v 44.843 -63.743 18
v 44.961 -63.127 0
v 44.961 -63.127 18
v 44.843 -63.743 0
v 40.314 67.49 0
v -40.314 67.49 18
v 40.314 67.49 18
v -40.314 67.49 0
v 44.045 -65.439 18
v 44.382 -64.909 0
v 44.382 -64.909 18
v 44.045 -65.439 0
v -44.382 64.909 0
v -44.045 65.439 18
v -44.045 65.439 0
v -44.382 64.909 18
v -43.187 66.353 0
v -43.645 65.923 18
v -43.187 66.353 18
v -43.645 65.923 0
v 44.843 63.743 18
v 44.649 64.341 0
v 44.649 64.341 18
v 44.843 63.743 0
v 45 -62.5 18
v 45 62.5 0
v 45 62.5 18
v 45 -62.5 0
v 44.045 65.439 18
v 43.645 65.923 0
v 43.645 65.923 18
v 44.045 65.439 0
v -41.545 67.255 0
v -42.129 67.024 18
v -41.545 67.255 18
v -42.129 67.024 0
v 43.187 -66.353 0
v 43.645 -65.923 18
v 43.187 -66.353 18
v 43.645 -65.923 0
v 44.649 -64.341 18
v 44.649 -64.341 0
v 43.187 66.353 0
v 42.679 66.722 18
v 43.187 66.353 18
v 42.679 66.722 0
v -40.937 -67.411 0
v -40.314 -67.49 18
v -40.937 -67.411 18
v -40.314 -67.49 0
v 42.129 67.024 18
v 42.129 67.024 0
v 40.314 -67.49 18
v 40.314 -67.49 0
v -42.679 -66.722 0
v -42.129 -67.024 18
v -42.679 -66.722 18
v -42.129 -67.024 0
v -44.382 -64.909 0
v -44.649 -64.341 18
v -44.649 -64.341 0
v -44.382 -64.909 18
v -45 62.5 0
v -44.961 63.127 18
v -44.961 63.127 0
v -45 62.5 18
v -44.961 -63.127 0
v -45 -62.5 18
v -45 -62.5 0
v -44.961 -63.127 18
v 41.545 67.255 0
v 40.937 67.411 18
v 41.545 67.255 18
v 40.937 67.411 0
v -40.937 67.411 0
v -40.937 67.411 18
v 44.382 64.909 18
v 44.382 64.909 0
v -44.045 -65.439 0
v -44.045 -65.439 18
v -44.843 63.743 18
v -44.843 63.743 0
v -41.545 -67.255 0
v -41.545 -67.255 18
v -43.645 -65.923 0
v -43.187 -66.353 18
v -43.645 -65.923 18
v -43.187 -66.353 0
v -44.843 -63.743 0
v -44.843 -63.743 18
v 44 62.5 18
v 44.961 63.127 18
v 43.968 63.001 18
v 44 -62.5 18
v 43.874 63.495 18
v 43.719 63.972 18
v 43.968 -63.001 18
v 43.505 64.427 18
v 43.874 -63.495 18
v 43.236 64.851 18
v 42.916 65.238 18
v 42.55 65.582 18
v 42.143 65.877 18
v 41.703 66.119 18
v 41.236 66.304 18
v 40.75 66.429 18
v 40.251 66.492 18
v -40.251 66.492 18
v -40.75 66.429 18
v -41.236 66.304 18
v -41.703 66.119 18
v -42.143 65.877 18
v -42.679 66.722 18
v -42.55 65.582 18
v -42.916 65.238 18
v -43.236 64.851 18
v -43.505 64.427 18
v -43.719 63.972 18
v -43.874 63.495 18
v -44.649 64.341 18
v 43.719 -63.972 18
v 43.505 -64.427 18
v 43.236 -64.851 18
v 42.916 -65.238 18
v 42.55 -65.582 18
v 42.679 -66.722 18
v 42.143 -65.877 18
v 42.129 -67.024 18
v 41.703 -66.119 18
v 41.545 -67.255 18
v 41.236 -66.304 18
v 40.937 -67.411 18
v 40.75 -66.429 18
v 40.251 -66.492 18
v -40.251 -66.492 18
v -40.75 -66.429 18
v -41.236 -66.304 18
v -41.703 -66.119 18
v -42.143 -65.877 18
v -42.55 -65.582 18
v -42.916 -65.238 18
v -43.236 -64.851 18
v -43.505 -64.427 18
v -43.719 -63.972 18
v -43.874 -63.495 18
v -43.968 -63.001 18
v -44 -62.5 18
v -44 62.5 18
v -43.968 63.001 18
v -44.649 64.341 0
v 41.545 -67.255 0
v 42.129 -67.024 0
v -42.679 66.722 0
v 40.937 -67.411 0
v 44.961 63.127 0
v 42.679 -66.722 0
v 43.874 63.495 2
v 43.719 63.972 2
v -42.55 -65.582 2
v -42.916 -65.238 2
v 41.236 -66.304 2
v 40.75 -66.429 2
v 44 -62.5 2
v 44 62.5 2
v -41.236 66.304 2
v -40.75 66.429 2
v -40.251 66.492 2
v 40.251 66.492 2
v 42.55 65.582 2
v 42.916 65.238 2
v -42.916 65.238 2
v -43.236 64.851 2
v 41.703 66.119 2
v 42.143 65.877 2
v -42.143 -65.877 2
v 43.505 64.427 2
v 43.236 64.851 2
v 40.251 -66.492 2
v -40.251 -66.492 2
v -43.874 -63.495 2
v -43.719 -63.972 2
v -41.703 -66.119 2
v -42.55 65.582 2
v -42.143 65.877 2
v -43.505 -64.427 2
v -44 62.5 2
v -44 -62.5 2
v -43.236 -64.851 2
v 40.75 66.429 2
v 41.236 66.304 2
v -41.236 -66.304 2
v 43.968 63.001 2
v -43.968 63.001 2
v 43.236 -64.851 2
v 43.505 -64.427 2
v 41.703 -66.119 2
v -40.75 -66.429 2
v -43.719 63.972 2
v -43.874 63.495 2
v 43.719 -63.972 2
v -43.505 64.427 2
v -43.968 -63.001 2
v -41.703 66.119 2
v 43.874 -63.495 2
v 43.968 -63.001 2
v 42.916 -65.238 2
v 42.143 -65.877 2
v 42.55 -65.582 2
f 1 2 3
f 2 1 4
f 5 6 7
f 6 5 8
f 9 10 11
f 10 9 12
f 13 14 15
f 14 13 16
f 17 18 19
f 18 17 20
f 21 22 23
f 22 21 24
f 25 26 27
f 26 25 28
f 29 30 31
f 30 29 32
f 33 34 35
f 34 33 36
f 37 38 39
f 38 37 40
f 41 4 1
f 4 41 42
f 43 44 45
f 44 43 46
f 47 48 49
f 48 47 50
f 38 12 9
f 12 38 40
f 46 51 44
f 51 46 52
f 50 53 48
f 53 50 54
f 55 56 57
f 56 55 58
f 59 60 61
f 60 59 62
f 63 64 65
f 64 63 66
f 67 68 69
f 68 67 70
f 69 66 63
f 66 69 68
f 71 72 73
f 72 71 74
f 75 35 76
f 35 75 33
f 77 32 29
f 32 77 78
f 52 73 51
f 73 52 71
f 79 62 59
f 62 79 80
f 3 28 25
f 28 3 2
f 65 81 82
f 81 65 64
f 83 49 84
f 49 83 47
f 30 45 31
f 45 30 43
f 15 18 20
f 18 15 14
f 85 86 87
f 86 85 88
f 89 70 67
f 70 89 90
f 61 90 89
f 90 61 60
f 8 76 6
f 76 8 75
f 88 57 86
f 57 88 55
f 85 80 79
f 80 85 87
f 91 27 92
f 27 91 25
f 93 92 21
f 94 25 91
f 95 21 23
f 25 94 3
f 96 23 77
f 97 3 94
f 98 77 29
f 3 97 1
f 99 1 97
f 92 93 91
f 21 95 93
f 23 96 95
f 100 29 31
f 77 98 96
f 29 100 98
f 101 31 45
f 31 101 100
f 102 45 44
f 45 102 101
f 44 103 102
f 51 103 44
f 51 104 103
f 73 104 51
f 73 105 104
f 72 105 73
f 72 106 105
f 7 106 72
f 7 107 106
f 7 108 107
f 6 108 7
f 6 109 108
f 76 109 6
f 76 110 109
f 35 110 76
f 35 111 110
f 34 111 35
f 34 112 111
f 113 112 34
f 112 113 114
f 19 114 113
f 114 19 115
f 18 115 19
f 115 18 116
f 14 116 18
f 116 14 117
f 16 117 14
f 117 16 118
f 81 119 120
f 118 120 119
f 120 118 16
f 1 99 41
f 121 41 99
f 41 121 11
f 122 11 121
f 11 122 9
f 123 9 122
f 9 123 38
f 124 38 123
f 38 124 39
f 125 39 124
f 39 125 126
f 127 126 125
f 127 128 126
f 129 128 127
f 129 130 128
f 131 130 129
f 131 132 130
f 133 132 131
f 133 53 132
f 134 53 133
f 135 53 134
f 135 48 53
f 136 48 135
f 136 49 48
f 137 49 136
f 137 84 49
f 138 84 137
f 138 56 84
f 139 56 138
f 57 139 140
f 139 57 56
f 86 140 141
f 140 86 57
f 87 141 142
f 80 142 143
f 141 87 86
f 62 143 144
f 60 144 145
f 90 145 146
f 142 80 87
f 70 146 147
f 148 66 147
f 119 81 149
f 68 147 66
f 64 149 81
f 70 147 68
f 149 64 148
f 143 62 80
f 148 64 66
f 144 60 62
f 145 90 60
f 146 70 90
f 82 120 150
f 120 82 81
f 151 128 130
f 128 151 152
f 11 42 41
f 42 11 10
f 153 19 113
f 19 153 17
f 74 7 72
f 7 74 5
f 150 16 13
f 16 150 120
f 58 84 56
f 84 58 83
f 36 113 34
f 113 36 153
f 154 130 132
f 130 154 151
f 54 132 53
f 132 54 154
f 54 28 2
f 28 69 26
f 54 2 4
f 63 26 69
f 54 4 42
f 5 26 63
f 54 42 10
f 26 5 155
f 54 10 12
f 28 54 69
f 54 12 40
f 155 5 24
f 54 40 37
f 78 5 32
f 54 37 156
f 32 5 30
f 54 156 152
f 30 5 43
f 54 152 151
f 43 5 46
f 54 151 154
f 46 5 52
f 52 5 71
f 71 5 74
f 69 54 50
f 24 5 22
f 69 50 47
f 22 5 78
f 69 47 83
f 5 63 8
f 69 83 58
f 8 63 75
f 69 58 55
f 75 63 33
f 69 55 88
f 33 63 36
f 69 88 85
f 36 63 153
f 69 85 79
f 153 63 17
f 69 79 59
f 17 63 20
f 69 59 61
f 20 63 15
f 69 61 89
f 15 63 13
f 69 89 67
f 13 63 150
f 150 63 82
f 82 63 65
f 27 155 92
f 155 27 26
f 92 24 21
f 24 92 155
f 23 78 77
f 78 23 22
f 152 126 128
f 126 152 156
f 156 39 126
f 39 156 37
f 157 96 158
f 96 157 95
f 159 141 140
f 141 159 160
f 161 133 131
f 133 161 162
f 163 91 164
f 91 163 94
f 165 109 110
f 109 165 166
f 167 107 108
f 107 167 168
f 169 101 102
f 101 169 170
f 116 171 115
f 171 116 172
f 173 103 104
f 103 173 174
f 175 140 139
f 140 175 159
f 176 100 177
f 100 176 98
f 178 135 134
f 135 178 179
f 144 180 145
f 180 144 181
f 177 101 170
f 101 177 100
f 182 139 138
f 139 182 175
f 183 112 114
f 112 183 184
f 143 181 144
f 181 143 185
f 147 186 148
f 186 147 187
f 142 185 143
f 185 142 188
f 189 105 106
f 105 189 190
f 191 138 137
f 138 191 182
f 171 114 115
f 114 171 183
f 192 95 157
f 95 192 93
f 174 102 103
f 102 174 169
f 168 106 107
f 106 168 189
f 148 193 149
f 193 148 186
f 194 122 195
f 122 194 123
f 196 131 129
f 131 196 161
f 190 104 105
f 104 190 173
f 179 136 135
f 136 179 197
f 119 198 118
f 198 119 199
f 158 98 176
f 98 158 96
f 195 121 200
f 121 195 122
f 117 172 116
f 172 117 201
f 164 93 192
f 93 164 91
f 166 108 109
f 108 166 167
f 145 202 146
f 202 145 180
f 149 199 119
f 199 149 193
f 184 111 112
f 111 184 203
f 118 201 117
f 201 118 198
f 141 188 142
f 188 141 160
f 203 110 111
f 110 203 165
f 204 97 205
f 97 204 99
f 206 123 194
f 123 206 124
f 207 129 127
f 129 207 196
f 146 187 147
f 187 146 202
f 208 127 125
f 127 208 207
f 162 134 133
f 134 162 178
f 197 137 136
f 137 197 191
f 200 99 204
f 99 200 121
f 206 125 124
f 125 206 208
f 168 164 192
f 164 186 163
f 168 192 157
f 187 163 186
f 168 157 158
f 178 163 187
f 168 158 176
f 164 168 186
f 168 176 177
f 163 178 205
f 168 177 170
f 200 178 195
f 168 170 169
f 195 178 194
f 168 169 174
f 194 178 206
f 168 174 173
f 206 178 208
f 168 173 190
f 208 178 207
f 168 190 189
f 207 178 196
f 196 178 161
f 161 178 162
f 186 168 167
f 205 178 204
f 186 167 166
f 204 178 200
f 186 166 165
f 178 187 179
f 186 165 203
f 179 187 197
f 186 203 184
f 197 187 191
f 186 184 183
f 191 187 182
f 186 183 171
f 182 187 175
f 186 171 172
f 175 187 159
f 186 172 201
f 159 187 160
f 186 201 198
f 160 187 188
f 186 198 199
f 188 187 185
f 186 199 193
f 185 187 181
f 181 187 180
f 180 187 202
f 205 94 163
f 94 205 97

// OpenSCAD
$fn = 50;


difference() {
	union() {
		hull() {
			translate(v = [-40.0000000000, 62.5000000000, 0]) {
				cylinder(h = 18, r = 5);
			}
			translate(v = [40.0000000000, 62.5000000000, 0]) {
				cylinder(h = 18, r = 5);
			}
			translate(v = [-40.0000000000, -62.5000000000, 0]) {
				cylinder(h = 18, r = 5);
			}
			translate(v = [40.0000000000, -62.5000000000, 0]) {
				cylinder(h = 18, r = 5);
			}
		}
	}
	union() {
		translate(v = [0, 0, 2]) {
			hull() {
				translate(v = [-40.0000000000, 62.5000000000, 0]) {
					cylinder(h = 16, r = 4);
				}
				translate(v = [40.0000000000, 62.5000000000, 0]) {
					cylinder(h = 16, r = 4);
				}
				translate(v = [-40.0000000000, -62.5000000000, 0]) {
					cylinder(h = 16, r = 4);
				}
				translate(v = [40.0000000000, -62.5000000000, 0]) {
					cylinder(h = 16, r = 4);
				}
			}
		}
	}
}
